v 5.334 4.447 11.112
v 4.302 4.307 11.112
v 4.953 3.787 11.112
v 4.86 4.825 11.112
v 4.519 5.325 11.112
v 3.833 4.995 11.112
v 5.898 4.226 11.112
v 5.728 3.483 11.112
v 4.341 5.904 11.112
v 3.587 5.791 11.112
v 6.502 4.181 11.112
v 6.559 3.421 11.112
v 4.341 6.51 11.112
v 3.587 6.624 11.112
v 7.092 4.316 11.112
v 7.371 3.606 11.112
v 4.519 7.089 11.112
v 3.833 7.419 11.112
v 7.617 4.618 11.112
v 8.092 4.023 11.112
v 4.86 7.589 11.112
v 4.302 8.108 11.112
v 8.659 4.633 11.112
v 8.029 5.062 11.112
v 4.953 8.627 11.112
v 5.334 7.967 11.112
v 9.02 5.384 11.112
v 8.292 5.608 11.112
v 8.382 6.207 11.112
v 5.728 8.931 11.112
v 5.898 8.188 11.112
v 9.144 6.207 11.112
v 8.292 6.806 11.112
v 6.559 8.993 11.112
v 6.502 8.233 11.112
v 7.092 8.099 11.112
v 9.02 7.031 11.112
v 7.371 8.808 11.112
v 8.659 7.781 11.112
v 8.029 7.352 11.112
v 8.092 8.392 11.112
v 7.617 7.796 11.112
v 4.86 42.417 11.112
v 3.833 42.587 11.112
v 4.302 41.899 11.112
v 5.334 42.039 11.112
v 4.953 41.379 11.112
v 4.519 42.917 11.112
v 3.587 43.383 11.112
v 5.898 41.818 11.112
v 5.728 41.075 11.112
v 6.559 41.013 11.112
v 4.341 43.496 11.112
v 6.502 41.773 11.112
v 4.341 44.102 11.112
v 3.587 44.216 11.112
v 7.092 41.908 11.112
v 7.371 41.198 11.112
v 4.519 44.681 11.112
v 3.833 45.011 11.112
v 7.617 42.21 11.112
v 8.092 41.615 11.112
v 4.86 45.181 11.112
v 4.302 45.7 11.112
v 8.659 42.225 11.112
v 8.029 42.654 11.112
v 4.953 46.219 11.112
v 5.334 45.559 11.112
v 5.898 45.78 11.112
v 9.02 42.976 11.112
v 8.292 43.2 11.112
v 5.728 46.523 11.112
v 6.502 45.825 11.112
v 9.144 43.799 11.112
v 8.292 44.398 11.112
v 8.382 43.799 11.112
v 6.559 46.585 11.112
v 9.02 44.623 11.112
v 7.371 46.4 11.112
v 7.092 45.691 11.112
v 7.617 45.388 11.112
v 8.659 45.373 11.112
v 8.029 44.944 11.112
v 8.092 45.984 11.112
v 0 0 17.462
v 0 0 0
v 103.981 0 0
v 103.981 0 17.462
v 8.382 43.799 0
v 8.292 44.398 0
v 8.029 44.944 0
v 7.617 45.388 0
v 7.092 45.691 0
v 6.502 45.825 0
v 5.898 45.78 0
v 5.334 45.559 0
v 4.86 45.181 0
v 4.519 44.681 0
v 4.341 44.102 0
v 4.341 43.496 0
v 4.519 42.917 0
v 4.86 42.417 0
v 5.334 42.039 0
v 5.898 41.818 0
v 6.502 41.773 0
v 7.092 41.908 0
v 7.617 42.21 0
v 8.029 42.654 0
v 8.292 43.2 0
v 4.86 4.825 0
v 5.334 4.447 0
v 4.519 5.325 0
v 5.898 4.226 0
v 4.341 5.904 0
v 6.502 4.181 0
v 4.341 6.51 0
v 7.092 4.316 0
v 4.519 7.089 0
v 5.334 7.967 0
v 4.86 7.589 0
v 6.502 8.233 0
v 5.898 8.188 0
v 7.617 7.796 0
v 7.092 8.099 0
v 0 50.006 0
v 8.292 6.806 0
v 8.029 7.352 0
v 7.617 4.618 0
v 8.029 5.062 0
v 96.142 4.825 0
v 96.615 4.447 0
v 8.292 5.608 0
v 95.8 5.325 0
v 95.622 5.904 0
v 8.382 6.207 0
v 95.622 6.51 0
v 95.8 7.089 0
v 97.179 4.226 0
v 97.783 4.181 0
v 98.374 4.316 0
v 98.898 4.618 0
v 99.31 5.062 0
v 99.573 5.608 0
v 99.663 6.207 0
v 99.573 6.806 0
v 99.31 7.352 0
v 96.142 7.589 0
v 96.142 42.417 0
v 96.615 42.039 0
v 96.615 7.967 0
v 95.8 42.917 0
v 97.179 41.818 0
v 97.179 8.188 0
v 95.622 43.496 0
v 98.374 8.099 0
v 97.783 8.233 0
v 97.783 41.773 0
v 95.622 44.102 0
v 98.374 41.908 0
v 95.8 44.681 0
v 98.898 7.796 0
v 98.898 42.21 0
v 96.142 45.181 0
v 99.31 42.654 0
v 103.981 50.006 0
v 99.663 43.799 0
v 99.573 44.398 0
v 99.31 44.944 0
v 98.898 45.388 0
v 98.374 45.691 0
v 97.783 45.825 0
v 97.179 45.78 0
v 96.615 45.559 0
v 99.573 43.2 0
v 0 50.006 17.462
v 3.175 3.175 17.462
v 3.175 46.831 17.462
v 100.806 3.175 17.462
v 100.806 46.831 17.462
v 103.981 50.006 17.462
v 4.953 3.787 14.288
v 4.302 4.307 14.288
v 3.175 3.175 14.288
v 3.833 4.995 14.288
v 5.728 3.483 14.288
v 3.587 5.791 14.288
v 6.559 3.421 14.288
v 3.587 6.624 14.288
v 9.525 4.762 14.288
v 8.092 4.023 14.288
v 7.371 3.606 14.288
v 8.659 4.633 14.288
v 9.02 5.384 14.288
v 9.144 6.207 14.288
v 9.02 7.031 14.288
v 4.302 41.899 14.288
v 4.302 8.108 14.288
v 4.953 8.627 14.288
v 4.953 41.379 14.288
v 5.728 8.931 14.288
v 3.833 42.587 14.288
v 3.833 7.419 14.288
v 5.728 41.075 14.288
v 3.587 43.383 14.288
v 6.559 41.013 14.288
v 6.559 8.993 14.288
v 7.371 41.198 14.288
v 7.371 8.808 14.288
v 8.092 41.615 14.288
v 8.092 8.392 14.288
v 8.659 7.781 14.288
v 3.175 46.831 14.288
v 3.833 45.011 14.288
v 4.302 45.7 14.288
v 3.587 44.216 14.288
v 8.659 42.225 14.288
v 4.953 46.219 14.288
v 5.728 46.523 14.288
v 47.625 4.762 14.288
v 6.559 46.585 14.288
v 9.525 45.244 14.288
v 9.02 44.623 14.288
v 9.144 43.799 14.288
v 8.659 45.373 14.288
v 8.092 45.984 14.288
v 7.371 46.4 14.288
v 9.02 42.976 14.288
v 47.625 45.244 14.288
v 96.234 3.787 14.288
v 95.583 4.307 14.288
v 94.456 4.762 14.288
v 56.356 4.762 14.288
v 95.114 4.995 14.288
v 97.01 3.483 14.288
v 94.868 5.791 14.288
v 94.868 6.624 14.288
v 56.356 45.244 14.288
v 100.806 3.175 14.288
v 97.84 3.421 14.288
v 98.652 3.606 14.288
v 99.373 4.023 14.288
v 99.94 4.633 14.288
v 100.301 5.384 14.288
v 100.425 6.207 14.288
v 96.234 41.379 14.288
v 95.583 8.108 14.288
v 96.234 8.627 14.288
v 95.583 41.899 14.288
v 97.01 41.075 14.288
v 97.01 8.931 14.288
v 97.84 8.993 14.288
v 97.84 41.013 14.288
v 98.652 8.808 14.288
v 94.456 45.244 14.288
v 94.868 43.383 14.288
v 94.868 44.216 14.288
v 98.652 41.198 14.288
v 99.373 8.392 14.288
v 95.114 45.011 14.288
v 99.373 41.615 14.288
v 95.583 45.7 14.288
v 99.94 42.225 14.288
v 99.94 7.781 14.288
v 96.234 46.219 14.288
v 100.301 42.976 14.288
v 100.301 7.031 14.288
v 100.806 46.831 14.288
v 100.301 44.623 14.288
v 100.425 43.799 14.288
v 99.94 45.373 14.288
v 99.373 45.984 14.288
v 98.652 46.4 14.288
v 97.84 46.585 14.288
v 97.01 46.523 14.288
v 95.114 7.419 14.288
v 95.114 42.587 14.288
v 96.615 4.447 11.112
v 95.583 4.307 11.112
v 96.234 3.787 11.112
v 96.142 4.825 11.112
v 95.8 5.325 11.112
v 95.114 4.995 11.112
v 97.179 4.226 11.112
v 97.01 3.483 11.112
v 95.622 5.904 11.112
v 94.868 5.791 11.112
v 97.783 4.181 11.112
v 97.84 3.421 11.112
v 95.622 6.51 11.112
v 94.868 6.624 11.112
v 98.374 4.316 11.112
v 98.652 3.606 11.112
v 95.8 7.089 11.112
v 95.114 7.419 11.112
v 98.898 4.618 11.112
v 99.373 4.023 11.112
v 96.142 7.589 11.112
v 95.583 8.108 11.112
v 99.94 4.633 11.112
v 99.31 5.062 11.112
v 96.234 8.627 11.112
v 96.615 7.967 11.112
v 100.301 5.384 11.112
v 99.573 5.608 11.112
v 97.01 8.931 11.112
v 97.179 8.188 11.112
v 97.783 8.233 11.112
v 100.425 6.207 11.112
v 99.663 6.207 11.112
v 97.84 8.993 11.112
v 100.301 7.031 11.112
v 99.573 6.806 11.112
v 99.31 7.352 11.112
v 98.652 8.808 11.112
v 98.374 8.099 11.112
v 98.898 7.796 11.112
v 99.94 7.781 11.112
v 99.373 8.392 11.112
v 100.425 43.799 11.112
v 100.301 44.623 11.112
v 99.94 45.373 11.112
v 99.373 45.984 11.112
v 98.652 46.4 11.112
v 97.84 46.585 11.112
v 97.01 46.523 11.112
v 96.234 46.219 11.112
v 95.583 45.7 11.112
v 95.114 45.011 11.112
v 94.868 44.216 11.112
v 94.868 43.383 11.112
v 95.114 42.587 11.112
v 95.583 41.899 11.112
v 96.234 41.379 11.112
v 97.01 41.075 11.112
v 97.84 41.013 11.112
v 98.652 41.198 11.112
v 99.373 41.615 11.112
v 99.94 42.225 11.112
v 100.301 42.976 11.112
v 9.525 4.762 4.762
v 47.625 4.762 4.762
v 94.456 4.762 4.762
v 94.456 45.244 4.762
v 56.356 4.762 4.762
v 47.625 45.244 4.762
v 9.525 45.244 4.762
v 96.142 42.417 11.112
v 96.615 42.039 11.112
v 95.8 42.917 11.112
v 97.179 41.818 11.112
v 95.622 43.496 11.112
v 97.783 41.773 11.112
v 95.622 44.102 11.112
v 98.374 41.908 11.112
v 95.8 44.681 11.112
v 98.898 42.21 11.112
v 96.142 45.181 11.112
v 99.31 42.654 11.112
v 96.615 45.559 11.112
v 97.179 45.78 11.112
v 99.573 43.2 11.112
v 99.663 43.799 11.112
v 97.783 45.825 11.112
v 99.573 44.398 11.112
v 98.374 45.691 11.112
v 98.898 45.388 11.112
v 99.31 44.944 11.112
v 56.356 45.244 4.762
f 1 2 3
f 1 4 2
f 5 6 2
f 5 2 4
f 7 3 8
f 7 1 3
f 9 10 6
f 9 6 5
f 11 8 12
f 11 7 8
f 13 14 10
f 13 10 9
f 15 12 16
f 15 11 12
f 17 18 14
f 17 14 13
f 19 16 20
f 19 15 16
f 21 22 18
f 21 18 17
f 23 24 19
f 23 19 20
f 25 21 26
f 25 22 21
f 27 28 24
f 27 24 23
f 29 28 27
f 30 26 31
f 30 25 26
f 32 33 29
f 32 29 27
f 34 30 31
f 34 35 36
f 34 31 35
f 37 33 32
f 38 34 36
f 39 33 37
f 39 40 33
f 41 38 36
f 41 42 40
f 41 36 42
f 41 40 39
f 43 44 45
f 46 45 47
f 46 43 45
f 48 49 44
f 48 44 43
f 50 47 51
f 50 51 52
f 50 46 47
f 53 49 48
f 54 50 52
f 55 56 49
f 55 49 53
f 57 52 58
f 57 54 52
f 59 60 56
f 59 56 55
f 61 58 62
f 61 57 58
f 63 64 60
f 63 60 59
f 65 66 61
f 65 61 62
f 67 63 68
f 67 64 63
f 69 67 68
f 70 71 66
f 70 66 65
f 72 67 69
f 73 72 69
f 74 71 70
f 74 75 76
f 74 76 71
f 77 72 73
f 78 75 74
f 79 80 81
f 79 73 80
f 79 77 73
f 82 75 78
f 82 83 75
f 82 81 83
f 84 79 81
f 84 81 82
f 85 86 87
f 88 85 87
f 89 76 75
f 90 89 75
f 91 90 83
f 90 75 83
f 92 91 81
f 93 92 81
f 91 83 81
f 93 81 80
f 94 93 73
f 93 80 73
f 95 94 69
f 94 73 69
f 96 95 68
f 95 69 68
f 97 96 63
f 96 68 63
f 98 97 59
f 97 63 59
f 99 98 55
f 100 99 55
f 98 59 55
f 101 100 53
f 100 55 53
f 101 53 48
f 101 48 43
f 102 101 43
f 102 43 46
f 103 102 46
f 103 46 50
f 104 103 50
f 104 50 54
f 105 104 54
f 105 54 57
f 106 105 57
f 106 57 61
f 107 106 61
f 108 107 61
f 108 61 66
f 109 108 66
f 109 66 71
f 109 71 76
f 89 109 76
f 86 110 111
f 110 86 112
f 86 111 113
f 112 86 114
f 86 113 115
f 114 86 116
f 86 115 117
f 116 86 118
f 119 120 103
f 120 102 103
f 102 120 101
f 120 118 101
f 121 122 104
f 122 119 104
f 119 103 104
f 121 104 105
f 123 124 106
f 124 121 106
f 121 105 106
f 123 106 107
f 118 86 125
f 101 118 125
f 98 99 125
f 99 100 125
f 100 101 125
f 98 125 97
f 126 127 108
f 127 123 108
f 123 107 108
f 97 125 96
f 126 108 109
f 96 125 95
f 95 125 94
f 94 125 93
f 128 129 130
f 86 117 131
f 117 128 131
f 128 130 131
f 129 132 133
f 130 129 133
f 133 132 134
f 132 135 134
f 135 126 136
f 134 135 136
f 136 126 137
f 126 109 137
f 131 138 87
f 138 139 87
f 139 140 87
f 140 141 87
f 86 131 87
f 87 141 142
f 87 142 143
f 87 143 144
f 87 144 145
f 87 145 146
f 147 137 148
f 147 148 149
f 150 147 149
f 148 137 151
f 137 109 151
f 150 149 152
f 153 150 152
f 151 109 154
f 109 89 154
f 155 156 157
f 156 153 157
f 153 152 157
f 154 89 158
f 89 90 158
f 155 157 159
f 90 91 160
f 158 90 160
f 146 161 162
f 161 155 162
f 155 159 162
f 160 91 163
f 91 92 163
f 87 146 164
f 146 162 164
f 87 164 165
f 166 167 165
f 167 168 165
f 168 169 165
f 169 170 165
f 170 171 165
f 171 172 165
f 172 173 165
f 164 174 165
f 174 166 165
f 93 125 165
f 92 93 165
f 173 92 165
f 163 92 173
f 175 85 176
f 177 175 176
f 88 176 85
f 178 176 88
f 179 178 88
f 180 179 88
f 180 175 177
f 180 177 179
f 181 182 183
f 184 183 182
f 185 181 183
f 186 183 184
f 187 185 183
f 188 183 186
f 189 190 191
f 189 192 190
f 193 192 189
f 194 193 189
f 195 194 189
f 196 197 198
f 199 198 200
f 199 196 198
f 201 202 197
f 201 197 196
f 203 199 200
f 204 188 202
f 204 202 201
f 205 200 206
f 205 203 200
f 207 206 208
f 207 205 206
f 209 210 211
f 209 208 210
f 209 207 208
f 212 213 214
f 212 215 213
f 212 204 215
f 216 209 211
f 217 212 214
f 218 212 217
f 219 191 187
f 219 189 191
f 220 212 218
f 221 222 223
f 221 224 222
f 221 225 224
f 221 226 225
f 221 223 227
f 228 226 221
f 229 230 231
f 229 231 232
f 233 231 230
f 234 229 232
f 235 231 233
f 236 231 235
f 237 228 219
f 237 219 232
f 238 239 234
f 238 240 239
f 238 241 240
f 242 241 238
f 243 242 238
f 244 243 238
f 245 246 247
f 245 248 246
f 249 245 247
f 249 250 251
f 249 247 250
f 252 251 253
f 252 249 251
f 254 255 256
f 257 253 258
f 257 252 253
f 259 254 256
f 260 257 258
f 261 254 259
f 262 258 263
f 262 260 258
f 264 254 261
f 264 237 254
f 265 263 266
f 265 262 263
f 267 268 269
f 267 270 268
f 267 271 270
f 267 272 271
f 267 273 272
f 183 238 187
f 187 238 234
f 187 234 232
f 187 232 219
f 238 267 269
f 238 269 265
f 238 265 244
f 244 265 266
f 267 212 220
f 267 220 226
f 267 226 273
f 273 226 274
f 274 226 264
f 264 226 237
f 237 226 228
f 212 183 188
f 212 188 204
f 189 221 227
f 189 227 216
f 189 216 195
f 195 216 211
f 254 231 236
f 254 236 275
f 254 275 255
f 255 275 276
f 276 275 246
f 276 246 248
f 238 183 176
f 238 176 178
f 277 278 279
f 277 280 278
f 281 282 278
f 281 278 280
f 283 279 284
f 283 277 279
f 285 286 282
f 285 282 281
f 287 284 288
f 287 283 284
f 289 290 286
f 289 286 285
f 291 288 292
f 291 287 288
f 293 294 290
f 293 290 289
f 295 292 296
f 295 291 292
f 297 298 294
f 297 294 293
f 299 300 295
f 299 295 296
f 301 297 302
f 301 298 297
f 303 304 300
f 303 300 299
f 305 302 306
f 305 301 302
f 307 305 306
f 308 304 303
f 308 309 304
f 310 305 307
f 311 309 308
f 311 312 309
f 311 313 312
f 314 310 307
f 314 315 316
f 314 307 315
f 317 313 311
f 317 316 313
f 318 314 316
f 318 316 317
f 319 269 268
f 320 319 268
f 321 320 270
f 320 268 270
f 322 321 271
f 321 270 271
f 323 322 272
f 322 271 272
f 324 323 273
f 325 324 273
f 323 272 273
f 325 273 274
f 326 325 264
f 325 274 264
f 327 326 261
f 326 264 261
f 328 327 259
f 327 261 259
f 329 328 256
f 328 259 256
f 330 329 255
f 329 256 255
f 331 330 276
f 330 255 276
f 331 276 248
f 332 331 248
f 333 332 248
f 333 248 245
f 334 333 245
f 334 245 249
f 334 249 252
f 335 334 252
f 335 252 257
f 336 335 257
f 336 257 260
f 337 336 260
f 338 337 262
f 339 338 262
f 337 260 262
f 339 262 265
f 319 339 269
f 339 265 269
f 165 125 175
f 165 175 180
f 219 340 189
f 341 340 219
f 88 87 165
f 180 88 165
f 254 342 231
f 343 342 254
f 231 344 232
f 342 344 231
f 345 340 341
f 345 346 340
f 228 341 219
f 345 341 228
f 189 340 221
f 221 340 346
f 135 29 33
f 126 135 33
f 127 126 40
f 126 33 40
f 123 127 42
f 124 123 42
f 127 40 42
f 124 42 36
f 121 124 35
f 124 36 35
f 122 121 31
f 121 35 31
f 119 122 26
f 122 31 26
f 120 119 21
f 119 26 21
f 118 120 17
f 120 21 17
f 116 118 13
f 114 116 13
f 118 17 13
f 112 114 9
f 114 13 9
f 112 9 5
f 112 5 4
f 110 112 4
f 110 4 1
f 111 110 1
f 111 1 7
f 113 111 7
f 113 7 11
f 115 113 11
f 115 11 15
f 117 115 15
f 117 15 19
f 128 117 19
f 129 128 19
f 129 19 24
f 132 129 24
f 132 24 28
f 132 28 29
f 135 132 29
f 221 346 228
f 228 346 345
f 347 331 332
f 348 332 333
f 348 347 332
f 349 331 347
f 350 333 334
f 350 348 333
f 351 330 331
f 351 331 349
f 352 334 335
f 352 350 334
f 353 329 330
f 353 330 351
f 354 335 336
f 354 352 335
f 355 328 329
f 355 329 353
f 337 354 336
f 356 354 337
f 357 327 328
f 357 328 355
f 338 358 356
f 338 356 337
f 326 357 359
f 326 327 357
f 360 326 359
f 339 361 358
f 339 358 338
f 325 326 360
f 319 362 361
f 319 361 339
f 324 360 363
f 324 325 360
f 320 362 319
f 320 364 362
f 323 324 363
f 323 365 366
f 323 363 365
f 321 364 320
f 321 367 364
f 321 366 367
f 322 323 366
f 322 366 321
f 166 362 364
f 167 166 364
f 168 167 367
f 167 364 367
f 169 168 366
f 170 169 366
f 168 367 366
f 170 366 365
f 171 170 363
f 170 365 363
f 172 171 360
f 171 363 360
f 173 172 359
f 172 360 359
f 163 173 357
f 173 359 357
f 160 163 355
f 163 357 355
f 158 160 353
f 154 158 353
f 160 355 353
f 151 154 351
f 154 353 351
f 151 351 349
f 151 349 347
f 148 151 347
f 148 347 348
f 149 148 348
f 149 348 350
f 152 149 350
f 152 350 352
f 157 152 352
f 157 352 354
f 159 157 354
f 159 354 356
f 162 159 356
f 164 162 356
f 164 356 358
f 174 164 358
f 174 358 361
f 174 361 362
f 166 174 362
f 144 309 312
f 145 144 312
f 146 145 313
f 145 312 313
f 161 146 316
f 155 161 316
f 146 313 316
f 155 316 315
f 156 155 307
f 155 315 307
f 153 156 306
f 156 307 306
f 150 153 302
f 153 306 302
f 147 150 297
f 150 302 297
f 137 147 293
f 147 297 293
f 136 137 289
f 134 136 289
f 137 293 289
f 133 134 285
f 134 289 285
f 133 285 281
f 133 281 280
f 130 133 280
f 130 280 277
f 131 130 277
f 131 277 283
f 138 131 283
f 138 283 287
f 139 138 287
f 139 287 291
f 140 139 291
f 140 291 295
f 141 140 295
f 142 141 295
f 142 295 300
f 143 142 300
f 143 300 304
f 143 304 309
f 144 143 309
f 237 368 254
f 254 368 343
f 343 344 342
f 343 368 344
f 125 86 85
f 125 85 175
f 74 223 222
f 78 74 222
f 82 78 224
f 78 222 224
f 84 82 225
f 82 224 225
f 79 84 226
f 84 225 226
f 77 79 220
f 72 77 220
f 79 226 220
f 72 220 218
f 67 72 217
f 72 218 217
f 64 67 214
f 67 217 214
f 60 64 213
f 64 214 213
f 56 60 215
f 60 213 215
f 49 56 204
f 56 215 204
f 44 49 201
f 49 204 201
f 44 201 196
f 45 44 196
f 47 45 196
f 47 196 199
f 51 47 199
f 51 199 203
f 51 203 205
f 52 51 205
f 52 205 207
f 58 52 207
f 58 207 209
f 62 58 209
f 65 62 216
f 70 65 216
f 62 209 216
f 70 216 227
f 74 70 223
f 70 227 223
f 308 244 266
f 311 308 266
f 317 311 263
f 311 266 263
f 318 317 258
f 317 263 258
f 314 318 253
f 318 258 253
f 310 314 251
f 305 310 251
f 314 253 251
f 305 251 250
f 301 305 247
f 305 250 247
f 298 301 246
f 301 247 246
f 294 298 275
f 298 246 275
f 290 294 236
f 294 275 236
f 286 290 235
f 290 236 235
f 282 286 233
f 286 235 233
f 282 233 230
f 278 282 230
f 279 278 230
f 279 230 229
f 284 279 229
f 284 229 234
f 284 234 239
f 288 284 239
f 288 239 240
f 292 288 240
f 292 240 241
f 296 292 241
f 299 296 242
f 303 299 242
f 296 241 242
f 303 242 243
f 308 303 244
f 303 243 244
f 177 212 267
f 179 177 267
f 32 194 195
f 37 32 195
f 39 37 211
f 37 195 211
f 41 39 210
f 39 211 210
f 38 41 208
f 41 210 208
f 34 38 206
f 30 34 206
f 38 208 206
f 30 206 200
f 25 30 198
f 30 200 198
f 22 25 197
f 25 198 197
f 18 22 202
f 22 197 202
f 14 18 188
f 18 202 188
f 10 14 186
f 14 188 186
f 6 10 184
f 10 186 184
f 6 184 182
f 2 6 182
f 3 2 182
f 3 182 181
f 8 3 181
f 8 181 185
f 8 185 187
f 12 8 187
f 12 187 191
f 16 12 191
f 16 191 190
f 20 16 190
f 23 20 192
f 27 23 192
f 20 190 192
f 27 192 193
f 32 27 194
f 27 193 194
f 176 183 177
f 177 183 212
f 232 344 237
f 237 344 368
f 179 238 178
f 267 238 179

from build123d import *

# Parameters (mm, degrees)
F0_W     = 103.98125
F0_H     = 50.00625
F0_W_2   = 97.63125
F0_H_2   = 43.65625
F0_W_3   = 38.1
F0_H_3   = 40.48125
F1_DEPTH = 4.7625
F2_DEPTH = 14.2875
F3_DEPTH = 17.4625
F4_R     = 2.794
F4_R_2   = 2.032
F5_DEPTH = 3.175
F6_DEPTH = 14.2875


with BuildPart() as f1:
    # F0 (on Top) → F1 (new body)
    with BuildSketch(Plane.XY):
        with Locations((51.990625, 25.003125)):
            Rectangle(F0_W, F0_H)
        with Locations((51.990625, 25.003125)):
            Rectangle(F0_W_2, F0_H_2, mode=Mode.SUBTRACT)
        with Locations((51.990625, 25.003125)):
            Rectangle(F0_W_2, F0_H_2)
        with Locations((28.575, 25.003125)):
            Rectangle(F0_W_3, F0_H_3, mode=Mode.SUBTRACT)
        with Locations((75.40625, 25.003125)):
            Rectangle(F0_W_3, F0_H_3, mode=Mode.SUBTRACT)
        with Locations((28.575, 25.003125)):
            Rectangle(F0_W_3, F0_H_3)
        with Locations((75.40625, 25.003125)):
            Rectangle(F0_W_3, F0_H_3)
    extrude(amount=F1_DEPTH)

    # F0 (on Top) → F2 (join)
    with BuildSketch(Plane.XY):
        with Locations((51.990625, 25.003125)):
            Rectangle(F0_W, F0_H)
        with Locations((51.990625, 25.003125)):
            Rectangle(F0_W_2, F0_H_2, mode=Mode.SUBTRACT)
        with Locations((51.990625, 25.003125)):
            Rectangle(F0_W_2, F0_H_2)
        with Locations((28.575, 25.003125)):
            Rectangle(F0_W_3, F0_H_3, mode=Mode.SUBTRACT)
        with Locations((75.40625, 25.003125)):
            Rectangle(F0_W_3, F0_H_3, mode=Mode.SUBTRACT)
    extrude(amount=F2_DEPTH)

    # F0 (on Top) → F3 (join)
    with BuildSketch(Plane.XY):
        with Locations((51.990625, 25.003125)):
            Rectangle(F0_W, F0_H)
        with Locations((51.990625, 25.003125)):
            Rectangle(F0_W_2, F0_H_2, mode=Mode.SUBTRACT)
    extrude(amount=F3_DEPTH)

    # F4 (on face) → F5 (cut)
    with BuildSketch(Plane.XY.offset(14.2875)):
        with Locations((6.35, 43.799125)):
            Circle(F4_R)
        with Locations((6.35, 43.799125)):
            Circle(F4_R_2, mode=Mode.SUBTRACT)
        with Locations((6.35, 6.207125)):
            Circle(F4_R)
        with Locations((6.35, 6.207125)):
            Circle(F4_R_2, mode=Mode.SUBTRACT)
        with Locations((97.63125, 43.799125)):
            Circle(F4_R)
        with Locations((97.63125, 43.799125)):
            Circle(F4_R_2, mode=Mode.SUBTRACT)
        with Locations((97.63125, 6.207125)):
            Circle(F4_R)
        with Locations((97.63125, 6.207125)):
            Circle(F4_R_2, mode=Mode.SUBTRACT)
    extrude(amount=-F5_DEPTH, mode=Mode.SUBTRACT)

    # F6 (cut, through all): faces of the model
    f6_faces = [f1.faces().sort_by_distance(p)[0] for p in [
        (6.35, 43.799125, 14.2875),
        (97.63125, 43.799125, 14.2875),
        (97.63125, 6.207125, 14.2875),
        (6.35, 6.207125, 14.2875),
    ]]
    extrude(f6_faces, amount=-F6_DEPTH, mode=Mode.SUBTRACT)


solid = f1.part
